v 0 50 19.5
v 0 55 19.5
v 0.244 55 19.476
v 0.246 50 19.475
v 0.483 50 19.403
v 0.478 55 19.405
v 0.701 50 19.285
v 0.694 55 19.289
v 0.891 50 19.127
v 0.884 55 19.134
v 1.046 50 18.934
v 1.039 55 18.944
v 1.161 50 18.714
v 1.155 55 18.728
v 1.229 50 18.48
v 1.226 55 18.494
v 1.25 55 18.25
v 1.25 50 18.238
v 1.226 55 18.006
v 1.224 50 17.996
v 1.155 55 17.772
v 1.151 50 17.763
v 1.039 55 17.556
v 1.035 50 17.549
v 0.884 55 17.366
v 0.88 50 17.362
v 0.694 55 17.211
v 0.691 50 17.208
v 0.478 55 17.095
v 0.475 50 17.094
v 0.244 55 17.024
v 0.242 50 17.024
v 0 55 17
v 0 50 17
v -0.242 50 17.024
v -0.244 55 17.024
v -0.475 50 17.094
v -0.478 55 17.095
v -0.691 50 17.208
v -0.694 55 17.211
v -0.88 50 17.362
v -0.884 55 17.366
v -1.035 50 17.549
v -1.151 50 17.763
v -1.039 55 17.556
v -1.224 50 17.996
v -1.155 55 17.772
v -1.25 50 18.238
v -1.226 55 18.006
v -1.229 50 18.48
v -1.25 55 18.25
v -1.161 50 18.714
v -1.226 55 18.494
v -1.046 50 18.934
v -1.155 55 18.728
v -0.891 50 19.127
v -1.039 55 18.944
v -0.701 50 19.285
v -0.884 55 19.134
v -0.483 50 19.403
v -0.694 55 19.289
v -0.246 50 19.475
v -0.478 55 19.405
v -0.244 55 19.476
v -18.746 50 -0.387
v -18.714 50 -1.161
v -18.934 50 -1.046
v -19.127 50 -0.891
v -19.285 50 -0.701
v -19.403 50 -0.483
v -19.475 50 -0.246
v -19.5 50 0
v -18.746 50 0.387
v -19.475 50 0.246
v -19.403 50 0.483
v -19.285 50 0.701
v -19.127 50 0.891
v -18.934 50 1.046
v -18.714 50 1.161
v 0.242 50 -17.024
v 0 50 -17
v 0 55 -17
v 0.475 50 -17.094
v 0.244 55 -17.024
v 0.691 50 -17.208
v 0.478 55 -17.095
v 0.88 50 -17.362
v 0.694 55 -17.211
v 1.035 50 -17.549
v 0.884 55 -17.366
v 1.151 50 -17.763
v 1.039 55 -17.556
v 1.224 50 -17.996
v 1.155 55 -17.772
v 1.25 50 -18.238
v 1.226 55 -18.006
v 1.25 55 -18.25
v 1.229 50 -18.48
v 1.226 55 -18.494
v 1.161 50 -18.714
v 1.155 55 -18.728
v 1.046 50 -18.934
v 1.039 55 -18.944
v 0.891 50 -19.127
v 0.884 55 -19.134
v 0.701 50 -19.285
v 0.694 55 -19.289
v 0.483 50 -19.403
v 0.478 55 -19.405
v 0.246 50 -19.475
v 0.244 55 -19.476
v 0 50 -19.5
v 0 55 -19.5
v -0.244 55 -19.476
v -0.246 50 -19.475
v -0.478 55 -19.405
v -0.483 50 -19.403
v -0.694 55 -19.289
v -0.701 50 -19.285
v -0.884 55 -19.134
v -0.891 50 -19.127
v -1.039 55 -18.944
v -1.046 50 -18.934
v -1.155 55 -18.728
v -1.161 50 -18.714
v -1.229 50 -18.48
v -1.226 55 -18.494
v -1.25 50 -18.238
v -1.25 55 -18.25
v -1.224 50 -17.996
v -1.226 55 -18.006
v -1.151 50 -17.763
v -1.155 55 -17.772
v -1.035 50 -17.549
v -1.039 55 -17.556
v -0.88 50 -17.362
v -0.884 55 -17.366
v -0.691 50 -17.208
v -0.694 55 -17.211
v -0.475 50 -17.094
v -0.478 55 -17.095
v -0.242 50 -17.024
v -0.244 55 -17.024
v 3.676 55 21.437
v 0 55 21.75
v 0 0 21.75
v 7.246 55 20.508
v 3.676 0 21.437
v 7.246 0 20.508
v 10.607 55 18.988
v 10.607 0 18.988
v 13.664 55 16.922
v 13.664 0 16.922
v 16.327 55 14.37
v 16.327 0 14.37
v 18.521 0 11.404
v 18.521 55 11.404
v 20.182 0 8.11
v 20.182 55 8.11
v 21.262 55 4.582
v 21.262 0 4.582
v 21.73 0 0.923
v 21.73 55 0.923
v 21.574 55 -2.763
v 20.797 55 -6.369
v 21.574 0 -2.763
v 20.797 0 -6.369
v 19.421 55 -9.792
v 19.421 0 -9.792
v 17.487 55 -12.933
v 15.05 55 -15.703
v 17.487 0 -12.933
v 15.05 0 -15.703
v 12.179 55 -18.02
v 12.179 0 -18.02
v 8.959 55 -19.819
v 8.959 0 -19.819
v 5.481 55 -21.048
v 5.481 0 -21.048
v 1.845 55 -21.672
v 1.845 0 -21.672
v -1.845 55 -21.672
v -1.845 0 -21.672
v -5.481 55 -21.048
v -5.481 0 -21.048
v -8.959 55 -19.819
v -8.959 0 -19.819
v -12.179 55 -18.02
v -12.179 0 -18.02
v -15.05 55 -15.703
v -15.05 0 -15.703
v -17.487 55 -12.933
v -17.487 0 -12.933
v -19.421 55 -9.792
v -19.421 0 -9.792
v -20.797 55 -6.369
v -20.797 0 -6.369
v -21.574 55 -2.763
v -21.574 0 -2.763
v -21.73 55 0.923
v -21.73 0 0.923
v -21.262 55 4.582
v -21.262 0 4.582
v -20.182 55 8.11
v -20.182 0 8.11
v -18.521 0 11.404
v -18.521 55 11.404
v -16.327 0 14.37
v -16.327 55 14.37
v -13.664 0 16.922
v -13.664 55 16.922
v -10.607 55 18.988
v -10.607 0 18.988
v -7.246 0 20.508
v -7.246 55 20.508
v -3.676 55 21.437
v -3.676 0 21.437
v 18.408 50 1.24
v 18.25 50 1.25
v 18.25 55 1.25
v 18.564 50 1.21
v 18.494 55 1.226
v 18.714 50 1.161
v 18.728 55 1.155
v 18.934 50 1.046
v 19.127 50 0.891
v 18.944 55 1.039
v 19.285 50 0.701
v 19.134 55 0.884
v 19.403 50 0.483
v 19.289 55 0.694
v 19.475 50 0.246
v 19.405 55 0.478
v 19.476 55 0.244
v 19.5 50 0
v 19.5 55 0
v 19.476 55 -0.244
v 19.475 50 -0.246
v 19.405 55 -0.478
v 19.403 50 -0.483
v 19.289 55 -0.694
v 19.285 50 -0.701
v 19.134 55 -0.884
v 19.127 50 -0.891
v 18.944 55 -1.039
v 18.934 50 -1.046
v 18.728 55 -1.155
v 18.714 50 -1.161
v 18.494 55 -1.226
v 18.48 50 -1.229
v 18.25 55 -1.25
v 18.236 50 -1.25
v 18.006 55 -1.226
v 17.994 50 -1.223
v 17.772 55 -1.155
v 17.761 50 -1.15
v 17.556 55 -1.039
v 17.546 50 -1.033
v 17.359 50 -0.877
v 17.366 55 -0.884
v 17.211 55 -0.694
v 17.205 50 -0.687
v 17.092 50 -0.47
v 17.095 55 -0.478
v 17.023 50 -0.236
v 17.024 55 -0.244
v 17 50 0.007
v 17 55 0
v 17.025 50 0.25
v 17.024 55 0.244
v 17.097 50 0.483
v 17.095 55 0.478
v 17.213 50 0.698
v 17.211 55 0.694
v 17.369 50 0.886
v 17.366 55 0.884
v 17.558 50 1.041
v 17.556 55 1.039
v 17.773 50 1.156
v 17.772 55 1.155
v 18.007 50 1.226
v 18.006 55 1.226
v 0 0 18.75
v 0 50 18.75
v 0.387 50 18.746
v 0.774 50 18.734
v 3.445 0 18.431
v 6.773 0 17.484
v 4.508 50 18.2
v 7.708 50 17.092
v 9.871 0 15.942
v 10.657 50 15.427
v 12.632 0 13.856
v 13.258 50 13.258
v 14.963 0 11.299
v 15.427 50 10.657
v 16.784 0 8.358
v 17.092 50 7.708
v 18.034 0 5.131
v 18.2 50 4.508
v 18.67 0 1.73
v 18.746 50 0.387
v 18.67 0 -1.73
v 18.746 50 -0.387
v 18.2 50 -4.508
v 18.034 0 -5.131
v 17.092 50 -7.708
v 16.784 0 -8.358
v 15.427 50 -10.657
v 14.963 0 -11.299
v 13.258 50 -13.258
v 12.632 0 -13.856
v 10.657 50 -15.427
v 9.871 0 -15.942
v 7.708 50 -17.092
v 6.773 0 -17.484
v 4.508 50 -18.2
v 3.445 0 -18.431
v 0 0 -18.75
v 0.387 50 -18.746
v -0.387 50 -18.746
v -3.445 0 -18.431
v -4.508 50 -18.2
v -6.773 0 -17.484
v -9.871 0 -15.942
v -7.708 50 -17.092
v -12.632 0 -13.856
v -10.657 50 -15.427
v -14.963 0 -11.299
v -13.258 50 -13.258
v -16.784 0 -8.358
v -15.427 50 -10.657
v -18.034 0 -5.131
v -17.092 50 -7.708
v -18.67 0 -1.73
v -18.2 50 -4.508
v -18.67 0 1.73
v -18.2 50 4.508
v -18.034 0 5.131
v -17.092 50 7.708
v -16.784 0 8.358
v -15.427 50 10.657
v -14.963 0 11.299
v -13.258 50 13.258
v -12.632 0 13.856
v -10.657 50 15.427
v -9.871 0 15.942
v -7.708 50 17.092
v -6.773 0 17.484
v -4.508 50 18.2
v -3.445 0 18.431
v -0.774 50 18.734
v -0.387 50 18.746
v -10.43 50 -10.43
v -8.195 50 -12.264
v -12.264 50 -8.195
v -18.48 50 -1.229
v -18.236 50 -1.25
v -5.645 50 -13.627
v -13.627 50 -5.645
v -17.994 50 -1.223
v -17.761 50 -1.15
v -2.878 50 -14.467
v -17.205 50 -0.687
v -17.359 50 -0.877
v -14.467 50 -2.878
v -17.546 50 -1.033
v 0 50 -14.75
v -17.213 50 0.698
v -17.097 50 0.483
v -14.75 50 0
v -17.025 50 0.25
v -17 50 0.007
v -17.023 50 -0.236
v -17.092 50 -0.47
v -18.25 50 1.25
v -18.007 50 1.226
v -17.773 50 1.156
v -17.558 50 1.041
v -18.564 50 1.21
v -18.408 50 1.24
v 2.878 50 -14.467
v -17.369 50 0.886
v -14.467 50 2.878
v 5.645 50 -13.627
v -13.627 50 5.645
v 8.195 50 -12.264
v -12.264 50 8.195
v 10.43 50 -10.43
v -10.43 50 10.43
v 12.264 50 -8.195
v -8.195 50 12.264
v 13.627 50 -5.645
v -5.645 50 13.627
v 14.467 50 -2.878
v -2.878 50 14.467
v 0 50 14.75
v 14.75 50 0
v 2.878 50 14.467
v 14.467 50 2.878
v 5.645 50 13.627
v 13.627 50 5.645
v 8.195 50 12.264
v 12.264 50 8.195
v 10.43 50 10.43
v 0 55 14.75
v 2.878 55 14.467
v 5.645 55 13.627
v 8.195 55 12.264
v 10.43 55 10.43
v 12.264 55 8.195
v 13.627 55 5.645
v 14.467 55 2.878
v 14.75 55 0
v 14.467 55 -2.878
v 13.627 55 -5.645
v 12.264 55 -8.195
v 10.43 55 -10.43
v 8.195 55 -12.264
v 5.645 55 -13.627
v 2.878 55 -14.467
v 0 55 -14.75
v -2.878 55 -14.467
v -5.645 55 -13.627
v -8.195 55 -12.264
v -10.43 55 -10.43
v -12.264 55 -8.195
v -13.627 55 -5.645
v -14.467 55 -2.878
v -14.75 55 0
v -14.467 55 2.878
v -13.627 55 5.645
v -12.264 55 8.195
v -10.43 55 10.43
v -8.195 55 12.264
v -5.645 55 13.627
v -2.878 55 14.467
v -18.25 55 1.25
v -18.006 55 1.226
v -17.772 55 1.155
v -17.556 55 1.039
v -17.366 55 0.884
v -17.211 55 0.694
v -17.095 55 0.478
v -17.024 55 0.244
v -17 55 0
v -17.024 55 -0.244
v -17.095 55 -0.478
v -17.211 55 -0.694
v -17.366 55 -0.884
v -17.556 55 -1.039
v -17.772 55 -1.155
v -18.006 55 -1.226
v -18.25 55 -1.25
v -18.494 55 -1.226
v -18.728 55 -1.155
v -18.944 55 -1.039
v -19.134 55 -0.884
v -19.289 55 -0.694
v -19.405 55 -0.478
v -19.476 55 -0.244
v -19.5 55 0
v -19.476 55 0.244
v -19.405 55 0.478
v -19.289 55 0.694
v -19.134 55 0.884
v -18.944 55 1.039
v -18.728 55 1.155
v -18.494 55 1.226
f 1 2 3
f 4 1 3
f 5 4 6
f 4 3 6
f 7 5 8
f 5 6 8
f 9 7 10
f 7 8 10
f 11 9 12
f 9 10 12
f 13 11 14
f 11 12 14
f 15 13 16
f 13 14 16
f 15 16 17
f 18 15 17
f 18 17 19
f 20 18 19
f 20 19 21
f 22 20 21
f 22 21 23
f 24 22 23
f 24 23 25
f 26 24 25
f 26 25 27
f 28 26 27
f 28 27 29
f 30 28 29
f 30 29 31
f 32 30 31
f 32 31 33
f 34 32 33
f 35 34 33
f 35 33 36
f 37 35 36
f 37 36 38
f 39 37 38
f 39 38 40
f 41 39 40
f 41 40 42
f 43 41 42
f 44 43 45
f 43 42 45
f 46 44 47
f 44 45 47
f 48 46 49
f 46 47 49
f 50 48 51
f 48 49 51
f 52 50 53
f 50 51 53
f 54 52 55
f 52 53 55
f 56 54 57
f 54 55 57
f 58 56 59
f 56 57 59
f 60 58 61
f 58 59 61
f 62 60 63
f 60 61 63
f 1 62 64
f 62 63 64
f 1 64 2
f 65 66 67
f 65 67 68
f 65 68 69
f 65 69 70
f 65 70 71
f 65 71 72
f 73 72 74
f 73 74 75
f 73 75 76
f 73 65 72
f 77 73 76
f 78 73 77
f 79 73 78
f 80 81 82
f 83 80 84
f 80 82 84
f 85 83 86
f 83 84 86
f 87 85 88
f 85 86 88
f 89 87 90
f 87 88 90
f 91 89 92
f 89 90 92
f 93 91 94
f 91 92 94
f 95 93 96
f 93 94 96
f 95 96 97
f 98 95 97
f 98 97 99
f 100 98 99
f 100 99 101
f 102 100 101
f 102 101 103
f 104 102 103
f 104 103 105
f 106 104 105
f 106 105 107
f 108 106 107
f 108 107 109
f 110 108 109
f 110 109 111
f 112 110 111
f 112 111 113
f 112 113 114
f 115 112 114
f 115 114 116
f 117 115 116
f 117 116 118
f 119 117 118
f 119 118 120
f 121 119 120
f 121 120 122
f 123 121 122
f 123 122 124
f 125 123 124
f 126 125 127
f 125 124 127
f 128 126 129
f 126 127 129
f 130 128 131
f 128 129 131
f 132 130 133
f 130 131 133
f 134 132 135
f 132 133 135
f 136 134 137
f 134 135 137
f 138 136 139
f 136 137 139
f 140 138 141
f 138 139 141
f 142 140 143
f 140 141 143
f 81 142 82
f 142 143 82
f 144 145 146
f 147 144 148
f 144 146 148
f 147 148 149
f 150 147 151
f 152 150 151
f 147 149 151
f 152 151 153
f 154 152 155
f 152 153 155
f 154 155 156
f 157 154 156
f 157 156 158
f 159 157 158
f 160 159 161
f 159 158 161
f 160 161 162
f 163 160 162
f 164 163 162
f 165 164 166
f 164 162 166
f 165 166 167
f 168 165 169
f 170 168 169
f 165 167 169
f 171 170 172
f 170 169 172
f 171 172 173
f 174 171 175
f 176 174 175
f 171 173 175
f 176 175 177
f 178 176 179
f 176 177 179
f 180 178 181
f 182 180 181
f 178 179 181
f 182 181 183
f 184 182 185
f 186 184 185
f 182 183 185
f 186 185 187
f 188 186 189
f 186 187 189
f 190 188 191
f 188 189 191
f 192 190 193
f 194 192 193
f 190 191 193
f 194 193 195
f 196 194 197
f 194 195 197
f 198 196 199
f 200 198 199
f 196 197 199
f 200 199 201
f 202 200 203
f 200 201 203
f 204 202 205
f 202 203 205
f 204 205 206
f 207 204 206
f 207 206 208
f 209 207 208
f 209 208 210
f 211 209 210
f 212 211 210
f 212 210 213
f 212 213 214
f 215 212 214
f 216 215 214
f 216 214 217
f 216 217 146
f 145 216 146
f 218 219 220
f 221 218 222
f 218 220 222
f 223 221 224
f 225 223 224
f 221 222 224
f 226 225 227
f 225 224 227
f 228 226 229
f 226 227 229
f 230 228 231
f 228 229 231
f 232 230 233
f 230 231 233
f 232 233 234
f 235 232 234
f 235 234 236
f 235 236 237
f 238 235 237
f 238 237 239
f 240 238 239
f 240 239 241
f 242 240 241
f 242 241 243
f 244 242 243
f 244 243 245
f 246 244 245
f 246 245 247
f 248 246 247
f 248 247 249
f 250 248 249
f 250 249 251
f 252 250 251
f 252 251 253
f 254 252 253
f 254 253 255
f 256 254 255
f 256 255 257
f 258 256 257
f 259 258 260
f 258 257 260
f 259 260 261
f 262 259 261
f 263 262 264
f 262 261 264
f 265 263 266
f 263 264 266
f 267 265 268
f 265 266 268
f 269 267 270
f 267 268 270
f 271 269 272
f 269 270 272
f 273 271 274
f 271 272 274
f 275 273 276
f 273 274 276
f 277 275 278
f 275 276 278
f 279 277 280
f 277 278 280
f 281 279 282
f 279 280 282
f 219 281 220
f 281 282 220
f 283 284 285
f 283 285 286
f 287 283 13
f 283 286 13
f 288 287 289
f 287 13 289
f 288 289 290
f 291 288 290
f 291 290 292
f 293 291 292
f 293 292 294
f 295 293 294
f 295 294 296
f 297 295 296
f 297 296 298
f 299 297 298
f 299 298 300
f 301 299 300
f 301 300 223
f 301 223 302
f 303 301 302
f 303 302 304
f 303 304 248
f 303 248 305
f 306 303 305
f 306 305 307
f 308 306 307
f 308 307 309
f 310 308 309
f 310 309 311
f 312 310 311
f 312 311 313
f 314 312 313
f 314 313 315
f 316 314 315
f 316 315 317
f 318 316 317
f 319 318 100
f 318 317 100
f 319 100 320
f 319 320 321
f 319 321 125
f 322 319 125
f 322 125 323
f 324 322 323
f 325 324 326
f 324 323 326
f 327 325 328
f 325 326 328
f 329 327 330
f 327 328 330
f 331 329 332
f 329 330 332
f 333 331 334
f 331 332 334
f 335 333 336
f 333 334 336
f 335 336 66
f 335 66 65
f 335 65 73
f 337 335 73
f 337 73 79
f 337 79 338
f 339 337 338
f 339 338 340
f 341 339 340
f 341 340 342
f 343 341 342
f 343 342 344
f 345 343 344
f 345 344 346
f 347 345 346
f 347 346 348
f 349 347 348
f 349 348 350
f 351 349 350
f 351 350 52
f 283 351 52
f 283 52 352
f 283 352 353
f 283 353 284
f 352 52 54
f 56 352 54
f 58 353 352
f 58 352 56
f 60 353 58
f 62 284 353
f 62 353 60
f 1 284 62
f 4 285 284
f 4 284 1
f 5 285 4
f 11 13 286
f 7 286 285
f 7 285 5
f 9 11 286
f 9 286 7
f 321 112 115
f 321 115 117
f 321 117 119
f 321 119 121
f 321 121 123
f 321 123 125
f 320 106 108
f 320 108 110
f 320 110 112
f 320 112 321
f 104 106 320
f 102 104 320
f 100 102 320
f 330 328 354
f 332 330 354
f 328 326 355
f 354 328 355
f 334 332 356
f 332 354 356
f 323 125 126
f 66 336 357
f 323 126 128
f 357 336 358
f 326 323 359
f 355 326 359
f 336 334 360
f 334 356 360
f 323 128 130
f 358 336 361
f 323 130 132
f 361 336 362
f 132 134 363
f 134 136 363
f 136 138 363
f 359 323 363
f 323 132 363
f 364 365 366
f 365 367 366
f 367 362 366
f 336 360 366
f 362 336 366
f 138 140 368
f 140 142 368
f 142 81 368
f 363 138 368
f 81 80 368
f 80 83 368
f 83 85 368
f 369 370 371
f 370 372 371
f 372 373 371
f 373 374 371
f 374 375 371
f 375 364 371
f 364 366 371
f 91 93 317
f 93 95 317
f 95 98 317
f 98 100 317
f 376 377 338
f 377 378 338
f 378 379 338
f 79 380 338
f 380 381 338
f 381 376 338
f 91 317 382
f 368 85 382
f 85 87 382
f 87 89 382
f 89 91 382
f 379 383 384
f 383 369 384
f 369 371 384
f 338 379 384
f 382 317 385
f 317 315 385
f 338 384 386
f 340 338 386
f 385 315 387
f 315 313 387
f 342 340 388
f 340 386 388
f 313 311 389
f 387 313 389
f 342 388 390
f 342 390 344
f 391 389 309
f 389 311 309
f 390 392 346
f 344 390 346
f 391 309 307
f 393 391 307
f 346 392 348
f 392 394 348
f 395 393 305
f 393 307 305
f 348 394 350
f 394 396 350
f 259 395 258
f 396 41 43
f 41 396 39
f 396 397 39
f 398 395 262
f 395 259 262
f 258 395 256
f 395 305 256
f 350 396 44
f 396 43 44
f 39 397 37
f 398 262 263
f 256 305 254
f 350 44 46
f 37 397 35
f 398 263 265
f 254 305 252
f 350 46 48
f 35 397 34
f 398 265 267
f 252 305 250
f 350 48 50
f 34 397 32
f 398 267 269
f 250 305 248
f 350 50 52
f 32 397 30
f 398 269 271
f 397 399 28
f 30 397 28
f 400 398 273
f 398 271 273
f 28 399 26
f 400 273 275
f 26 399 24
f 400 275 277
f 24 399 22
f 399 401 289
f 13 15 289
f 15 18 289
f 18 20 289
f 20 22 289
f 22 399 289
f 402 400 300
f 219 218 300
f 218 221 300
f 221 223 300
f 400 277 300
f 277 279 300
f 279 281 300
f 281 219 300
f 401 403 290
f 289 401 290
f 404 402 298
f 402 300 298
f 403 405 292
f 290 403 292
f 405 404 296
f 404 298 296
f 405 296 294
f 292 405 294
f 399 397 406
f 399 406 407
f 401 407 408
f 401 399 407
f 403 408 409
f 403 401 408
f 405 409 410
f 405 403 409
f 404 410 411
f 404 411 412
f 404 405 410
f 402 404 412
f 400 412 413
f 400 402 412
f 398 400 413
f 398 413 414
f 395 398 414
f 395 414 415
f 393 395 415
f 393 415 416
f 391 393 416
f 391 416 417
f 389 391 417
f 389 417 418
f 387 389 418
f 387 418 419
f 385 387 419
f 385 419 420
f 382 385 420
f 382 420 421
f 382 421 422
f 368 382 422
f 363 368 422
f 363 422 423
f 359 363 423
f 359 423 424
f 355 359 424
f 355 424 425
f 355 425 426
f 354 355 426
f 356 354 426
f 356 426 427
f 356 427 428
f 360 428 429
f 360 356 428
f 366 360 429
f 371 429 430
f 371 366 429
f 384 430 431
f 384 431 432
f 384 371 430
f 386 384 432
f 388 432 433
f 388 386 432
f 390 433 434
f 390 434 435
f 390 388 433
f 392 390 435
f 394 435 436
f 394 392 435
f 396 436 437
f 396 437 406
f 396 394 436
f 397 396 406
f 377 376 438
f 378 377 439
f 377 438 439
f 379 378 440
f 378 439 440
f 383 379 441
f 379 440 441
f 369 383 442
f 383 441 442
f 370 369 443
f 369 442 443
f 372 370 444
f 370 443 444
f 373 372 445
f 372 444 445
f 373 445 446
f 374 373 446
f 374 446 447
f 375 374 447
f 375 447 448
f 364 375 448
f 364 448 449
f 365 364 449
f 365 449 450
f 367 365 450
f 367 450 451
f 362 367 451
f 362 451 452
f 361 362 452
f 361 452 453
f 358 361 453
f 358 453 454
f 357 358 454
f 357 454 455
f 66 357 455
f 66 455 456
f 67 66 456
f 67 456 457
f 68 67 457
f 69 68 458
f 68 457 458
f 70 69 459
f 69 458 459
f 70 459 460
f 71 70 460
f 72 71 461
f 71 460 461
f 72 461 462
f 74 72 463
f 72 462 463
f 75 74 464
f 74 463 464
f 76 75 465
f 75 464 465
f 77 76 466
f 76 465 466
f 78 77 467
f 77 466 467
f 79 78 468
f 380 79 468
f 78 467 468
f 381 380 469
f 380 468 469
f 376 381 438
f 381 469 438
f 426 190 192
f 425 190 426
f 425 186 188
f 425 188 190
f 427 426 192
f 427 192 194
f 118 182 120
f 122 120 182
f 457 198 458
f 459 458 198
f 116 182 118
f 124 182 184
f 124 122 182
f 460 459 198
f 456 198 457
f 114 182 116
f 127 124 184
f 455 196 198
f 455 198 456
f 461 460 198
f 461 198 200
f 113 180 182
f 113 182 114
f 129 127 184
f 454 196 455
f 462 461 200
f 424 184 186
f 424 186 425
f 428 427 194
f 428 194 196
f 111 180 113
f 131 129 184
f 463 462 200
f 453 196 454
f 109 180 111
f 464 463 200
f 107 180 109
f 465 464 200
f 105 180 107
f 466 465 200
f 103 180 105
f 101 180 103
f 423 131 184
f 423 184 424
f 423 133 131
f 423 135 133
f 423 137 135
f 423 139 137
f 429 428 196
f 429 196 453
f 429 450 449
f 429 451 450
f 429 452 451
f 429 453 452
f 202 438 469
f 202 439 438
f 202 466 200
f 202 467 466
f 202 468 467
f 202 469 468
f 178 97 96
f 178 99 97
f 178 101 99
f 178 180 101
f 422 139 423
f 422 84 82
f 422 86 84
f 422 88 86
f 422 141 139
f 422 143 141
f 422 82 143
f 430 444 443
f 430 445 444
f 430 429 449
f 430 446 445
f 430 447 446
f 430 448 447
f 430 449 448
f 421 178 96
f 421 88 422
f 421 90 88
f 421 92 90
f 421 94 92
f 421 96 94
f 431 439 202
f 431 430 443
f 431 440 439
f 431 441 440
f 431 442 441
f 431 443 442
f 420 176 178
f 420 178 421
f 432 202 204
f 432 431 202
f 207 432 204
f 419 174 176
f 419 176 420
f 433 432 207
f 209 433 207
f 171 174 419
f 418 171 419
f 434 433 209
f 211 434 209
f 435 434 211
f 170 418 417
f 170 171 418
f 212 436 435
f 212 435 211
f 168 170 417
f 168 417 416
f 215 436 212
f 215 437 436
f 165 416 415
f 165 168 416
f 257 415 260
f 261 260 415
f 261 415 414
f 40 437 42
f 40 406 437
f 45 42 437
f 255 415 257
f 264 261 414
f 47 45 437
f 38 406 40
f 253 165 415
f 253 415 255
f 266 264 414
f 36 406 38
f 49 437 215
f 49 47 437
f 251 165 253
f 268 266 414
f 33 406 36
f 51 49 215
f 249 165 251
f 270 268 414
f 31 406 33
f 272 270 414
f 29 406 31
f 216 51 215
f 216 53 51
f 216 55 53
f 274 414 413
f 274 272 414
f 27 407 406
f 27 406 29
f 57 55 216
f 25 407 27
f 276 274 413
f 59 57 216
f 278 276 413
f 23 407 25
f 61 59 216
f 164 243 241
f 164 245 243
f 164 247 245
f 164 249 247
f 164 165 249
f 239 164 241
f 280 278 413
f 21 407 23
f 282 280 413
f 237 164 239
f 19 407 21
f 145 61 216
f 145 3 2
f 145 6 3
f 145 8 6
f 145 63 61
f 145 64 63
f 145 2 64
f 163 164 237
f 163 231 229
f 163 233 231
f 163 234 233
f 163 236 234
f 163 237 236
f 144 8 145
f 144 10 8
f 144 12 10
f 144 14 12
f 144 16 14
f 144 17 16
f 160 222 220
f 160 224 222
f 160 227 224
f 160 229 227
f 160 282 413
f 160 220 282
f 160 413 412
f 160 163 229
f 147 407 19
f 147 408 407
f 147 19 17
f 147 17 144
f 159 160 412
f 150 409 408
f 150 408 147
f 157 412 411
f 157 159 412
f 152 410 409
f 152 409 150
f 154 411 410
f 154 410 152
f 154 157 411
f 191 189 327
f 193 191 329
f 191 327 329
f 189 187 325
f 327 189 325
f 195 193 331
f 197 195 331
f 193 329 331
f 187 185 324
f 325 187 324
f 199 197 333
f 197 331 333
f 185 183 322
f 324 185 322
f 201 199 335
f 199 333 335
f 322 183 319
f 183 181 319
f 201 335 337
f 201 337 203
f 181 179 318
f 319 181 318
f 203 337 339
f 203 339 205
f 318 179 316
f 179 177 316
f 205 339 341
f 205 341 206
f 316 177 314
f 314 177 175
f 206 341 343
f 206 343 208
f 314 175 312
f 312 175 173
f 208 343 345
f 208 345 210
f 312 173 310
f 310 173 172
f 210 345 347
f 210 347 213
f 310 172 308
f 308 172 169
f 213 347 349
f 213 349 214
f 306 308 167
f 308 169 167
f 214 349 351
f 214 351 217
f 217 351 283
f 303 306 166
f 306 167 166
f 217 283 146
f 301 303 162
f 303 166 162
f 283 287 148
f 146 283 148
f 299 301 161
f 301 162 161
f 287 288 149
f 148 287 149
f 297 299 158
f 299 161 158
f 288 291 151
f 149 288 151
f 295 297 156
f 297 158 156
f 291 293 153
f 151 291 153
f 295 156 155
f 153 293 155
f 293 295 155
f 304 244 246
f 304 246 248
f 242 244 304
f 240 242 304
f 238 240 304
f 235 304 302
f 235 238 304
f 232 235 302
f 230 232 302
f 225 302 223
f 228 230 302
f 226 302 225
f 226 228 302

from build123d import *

# Parameters (mm, degrees)
SKETCH_1_R          = 21.75
SKETCH_1_R_2        = 14.75
EXTRUDE_1_DEPTH     = 55
CUT_EXTRUDE_START   = -5
SKETCH_2_R          = 18.75
SKETCH_2_R_2        = 14.75
CUT_EXTRUDE_1_DEPTH = 59.016862823
SKETCH_3_R          = 1.25
CUT_EXTRUDE_2_DEPTH = 5


with BuildPart() as part:
    # ｽｹｯﾁ1 → ﾎﾞｽ - 押し出し1 (new body)
    with BuildSketch(Plane(origin=(0, 0, 0), x_dir=(1, 0, 0), z_dir=(0, 1, 0))):
        with Locations(Location((0, 0, 0), (0, 0, 270))):
            Circle(SKETCH_1_R)
        with Locations(Location((0, 0, 0), (0, 0, 270))):
            Circle(SKETCH_1_R_2, mode=Mode.SUBTRACT)
    extrude(amount=EXTRUDE_1_DEPTH)

    # ｽｹｯﾁ2 → ｶｯﾄ - 押し出し1 (cut, through all)
    with BuildSketch(Plane(origin=(0, 55, 0), x_dir=(1, 0, 0), z_dir=(0, 1, 0)).offset(CUT_EXTRUDE_START)):
        with Locations(Location((0, 0, 0), (0, 0, 270))):
            Circle(SKETCH_2_R)
        with Locations(Location((0, 0, 0), (0, 0, 270))):
            Circle(SKETCH_2_R_2, mode=Mode.SUBTRACT)
    extrude(amount=-CUT_EXTRUDE_1_DEPTH, mode=Mode.SUBTRACT)

    # ｽｹｯﾁ3 → ｶｯﾄ - 押し出し2 (cut)
    with BuildSketch(Plane(origin=(0, 55, 0), x_dir=(1, 0, 0), z_dir=(0, 1, 0))):
        with Locations(Location((0, 18.25, 0), (0, 0, 270))):
            Circle(SKETCH_3_R)
        with Locations(Location((18.25, 0, 0), (0, 0, 270))):
            Circle(SKETCH_3_R)
        with Locations(Location((0, -18.25, 0), (0, 0, 270))):
            Circle(SKETCH_3_R)
        with Locations(Location((-18.25, 0, 0), (0, 0, 270))):
            Circle(SKETCH_3_R)
    extrude(amount=-CUT_EXTRUDE_2_DEPTH, mode=Mode.SUBTRACT)


solid = part.part
